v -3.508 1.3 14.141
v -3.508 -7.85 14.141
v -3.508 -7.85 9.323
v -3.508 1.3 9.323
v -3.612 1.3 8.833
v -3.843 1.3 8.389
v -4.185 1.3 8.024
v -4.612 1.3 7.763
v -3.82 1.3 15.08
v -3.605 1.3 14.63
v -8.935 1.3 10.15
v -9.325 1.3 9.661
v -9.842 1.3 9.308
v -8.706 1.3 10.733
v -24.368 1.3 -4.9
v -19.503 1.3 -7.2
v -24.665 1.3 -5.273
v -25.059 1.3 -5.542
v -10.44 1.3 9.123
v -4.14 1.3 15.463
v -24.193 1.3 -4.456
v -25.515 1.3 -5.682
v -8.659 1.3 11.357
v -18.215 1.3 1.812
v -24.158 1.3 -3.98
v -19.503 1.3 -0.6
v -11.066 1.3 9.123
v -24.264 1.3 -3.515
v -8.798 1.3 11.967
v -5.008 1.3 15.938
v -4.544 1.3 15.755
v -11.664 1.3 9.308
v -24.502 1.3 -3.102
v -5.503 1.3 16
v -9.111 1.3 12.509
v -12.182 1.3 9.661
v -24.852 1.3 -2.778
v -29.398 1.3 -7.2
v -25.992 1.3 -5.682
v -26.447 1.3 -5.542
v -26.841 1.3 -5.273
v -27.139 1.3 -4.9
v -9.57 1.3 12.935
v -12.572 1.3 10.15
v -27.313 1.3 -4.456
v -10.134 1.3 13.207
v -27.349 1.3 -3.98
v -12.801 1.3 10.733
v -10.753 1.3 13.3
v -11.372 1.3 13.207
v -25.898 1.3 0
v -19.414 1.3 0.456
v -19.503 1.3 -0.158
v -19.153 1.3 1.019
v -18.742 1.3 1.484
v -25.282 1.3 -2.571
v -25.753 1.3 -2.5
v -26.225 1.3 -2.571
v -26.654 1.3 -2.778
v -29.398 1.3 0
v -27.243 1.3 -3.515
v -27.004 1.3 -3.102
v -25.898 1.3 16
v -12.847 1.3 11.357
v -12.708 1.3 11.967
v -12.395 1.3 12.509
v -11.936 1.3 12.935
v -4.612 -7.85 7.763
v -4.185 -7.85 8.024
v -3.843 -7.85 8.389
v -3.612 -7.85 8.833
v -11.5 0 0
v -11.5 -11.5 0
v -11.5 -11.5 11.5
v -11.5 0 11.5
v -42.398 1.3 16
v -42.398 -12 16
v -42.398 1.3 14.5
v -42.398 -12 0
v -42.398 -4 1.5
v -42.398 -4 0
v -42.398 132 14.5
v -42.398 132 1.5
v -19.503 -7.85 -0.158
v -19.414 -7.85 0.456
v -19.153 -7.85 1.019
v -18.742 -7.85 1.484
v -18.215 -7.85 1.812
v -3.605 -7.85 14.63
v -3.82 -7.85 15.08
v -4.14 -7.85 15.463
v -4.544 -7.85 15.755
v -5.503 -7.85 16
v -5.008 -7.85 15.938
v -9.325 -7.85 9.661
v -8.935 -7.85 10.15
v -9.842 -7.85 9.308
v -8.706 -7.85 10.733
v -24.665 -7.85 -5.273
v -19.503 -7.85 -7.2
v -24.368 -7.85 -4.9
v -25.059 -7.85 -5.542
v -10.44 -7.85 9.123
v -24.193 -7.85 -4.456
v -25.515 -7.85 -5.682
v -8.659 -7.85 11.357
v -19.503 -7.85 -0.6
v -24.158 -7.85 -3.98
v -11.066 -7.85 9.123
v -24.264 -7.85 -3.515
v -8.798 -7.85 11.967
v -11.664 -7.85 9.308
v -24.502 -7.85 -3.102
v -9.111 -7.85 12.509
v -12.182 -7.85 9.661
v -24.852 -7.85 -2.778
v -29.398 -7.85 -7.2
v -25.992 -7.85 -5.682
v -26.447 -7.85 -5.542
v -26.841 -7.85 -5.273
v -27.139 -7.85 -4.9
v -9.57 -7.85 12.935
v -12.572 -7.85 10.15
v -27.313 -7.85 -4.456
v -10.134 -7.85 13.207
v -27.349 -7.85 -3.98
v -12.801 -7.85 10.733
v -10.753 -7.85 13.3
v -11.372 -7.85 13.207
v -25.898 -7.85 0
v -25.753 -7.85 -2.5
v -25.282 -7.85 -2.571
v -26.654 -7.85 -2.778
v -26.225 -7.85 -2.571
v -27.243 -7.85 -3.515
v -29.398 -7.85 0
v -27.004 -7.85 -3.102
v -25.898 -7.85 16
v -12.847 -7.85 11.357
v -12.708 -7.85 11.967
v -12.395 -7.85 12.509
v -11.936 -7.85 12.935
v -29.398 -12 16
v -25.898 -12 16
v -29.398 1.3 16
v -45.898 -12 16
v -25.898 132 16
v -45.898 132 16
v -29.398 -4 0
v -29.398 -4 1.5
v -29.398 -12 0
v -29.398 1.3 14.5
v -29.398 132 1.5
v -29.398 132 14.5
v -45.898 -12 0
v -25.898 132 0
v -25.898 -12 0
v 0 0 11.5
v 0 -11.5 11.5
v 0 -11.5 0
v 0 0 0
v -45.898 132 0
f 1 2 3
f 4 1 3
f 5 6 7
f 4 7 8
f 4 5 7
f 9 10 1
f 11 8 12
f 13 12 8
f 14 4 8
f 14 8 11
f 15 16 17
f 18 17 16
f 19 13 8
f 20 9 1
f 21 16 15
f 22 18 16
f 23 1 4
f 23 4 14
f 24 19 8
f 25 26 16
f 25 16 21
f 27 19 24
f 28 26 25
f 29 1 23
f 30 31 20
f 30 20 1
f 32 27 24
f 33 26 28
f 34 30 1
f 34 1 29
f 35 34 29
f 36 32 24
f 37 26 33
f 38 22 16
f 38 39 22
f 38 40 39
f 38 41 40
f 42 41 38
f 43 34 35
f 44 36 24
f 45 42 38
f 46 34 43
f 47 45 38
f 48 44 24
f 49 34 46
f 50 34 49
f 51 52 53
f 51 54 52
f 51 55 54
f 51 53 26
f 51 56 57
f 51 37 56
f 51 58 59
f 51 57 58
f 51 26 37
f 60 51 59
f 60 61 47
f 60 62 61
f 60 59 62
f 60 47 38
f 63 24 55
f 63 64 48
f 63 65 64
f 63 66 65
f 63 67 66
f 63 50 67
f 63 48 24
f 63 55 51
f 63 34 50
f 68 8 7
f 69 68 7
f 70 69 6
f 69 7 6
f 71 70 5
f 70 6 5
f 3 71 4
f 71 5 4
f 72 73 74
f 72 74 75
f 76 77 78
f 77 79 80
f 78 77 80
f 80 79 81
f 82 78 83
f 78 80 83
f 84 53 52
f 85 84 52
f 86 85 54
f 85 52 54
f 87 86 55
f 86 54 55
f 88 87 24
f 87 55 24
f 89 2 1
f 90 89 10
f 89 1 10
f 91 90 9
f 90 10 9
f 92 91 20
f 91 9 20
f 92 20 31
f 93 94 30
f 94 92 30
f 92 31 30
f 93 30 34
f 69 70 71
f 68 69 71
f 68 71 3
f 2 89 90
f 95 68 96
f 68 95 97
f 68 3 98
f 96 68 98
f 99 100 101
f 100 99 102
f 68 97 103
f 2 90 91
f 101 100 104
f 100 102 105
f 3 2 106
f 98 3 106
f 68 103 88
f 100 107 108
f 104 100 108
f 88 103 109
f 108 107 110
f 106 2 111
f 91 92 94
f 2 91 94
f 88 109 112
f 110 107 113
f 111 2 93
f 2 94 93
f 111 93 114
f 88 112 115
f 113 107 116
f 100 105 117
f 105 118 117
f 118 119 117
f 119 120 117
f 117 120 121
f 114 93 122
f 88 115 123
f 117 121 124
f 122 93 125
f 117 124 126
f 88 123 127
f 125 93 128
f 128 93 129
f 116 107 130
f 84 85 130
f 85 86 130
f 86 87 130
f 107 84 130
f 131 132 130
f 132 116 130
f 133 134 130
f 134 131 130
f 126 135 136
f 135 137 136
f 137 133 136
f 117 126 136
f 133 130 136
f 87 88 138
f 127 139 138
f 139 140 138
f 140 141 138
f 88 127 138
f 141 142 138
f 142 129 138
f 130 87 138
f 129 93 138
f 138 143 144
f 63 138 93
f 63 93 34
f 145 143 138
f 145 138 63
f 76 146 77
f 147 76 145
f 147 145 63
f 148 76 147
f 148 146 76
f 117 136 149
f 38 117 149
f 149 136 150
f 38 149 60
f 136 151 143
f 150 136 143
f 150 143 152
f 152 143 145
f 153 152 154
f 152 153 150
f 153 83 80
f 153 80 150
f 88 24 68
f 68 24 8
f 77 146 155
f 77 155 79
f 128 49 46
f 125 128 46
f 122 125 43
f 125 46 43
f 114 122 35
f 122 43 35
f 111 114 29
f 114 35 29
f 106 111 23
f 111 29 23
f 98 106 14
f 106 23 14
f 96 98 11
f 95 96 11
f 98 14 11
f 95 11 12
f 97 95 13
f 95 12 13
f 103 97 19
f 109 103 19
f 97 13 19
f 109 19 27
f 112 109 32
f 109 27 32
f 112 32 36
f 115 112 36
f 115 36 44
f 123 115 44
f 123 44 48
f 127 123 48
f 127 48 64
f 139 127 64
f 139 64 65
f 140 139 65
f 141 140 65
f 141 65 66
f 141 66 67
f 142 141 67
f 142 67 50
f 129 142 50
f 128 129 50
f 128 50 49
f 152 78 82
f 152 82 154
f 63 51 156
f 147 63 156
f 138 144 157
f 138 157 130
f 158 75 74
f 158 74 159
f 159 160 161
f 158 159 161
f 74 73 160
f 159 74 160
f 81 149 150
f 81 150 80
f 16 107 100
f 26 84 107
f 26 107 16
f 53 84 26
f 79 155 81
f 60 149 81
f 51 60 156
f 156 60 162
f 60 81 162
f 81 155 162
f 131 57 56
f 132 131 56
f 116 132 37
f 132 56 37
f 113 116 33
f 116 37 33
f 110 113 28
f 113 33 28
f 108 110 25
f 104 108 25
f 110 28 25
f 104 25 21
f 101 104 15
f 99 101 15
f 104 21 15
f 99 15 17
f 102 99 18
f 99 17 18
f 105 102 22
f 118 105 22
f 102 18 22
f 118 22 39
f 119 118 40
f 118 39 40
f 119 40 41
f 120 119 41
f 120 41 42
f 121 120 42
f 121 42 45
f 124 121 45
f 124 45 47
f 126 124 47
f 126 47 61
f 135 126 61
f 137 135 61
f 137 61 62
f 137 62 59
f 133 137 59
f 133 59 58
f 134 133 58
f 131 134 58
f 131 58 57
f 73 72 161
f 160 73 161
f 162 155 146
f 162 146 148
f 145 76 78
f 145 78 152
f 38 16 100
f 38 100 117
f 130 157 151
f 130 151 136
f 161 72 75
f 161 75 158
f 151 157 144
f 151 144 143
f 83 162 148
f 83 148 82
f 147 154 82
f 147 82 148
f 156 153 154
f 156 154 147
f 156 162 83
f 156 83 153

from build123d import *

# Parameters (mm, degrees)
SKETCH1_W           = 11.5
SKETCH1_H           = 11.5
BOSS_EXTRUDE1_DEPTH = 11.5
SKETCH2_W           = 20
SKETCH2_H           = 144
BOSS_EXTRUDE2_DEPTH = 16
SKETCH4_W           = 13
SKETCH4_H           = 13
CUT_EXTRUDE1_DEPTH  = 152.98237065
SKETCH5_W           = 13
SKETCH5_H           = 13.3
CUT_EXTRUDE2_DEPTH  = 1.5
SKETCH6_W           = 13
SKETCH6_H           = 8
CUT_EXTRUDE3_DEPTH  = 1.5
SKETCH10_W          = 16
SKETCH10_H          = 13.3
BOSS_EXTRUDE3_DEPTH = 3.79
SKETCH11_W          = 7.29
SKETCH11_H          = 13.3
BOSS_EXTRUDE4_DEPTH = 7.2
SKETCH12_R          = 1.6
CUT_EXTRUDE4_DEPTH  = 13.3
SKETCH13_W          = 3.79
SKETCH13_H          = 4.15
CUT_EXTRUDE6_DEPTH  = 16
SKETCH15_W          = 7.2
SKETCH15_H          = 4.15
CUT_EXTRUDE7_DEPTH  = 16
SKETCH17_W          = 16.6
SKETCH17_H          = 9.15
BOSS_EXTRUDE5_DEPTH = 18.6
CUT_EXTRUDE10_DEPTH = 18.6
SKETCH22_R          = 2.1
CUT_EXTRUDE11_DEPTH = 18.6
SKETCH24_W          = 2.604961471
SKETCH24_H          = 9.15
BOSS_EXTRUDE6_DEPTH = 6.6


with BuildPart() as part:
    # Sketch1 → Boss-Extrude1 (new body)
    with BuildSketch(Plane.XY):
        with Locations((-5.75, -5.75)):
            Rectangle(SKETCH1_W, SKETCH1_H)
    extrude(amount=BOSS_EXTRUDE1_DEPTH)


with BuildPart() as body_2:
    # Sketch2 → Boss-Extrude2 (new body)
    with BuildSketch(Plane.XY):
        with Locations((-35.898158877, 60)):
            Rectangle(SKETCH2_W, SKETCH2_H)
    extrude(amount=BOSS_EXTRUDE2_DEPTH)

    # Sketch4 → Cut-Extrude1 (cut, through all)
    with BuildSketch(Plane(origin=(0, 132, 0), x_dir=(1, 0, 0), z_dir=(0, 1, 0))):
        with Locations((-35.898158877, -8)):
            Rectangle(SKETCH4_W, SKETCH4_H)
    extrude(amount=-CUT_EXTRUDE1_DEPTH, mode=Mode.SUBTRACT)

    # Sketch5 → Cut-Extrude2 (cut)
    with BuildSketch(Plane.XY.offset(16)):
        with Locations((-35.898158877, -5.35)):
            Rectangle(SKETCH5_W, SKETCH5_H)
    extrude(amount=-CUT_EXTRUDE2_DEPTH, mode=Mode.SUBTRACT)

    # Sketch6 → Cut-Extrude3 (cut)
    with BuildSketch(Plane(origin=(0, 0, 0), x_dir=(-1, 0, 0), z_dir=(0, 0, -1))):
        with Locations((35.898158877, -8)):
            Rectangle(SKETCH6_W, SKETCH6_H)
    extrude(amount=-CUT_EXTRUDE3_DEPTH, mode=Mode.SUBTRACT)

    # Sketch10 → Boss-Extrude3 (add)
    with BuildSketch(Plane(origin=(-25.898158877, 0, 0), x_dir=(0, 0, -1), z_dir=(1, 0, 0))):
        with Locations((-8, -5.35)):
            Rectangle(SKETCH10_W, SKETCH10_H)
    extrude(amount=BOSS_EXTRUDE3_DEPTH)

    # Sketch11 → Boss-Extrude4 (add)
    with BuildSketch(Plane(origin=(0, 0, 0), x_dir=(-1, 0, 0), z_dir=(0, 0, -1))):
        with Locations((25.753158877, -5.35)):
            Rectangle(SKETCH11_W, SKETCH11_H)
    extrude(amount=BOSS_EXTRUDE4_DEPTH)

    # Sketch12 → Cut-Extrude4 (cut)
    with BuildSketch(Plane(origin=(0, 1.3, 0), x_dir=(1, 0, 0), z_dir=(0, 1, 0))):
        with Locations(Location((-25.753158877, 4.1, 0), (0, 0, 270))):
            Circle(SKETCH12_R)
    extrude(amount=-CUT_EXTRUDE4_DEPTH, mode=Mode.SUBTRACT)

    # Sketch13 → Cut-Extrude6 (cut)
    with BuildSketch(Plane.XY.offset(16)):
        with Locations((-24.003158877, -9.925)):
            Rectangle(SKETCH13_W, SKETCH13_H)
    extrude(amount=-CUT_EXTRUDE6_DEPTH, mode=Mode.SUBTRACT)

    # Sketch15 → Cut-Extrude7 (cut)
    with BuildSketch(Plane(origin=(-22.108158877, 0, 0), x_dir=(0, 0, -1), z_dir=(1, 0, 0))):
        with Locations((3.6, -9.925)):
            Rectangle(SKETCH15_W, SKETCH15_H)
    extrude(amount=-CUT_EXTRUDE7_DEPTH, mode=Mode.SUBTRACT)

    # Sketch17 → Boss-Extrude5 (add)
    with BuildSketch(Plane(origin=(-22.108158877, 0, 0), x_dir=(0, 0, -1), z_dir=(1, 0, 0))):
        with Locations((-7.7, -3.275)):
            Rectangle(SKETCH17_W, SKETCH17_H)
    extrude(amount=BOSS_EXTRUDE5_DEPTH)

    # Sketch18 → Cut-Extrude10 (cut)
    with BuildSketch(Plane(origin=(0, 1.3, 0), x_dir=(1, 0, 0), z_dir=(0, 1, 0))):
        with BuildLine():
            ThreePointArc((-4.611682563, -7.76314008), (-3.843042235, -8.389419264), (-3.508158877, -9.322632373))
            Line((-3.508158877, -9.322632373), (-3.508158877, 0.6))
            Line((-3.508158877, 0.6), (-19.503197406, 0.6))
            Line((-19.503197406, 0.6), (-19.503197406, 0.15803115))
            ThreePointArc((-19.503197406, 0.15803115), (-19.152542434, -1.018768523), (-18.214957899, -1.81170712))
            Line((-18.214957899, -1.81170712), (-4.611682563, -7.76314008))
        make_face()
        with BuildLine():
            ThreePointArc((-3.508158877, -14.140788033), (-4.139668174, -15.463143203), (-5.503197406, -16))
            Line((-5.503197406, -16), (-3.508158877, -16))
            Line((-3.508158877, -16), (-3.508158877, -14.140788033))
        make_face()
    extrude(amount=-CUT_EXTRUDE10_DEPTH, mode=Mode.SUBTRACT)

    # Sketch22 → Cut-Extrude11 (cut)
    with BuildSketch(Plane(origin=(0, 1.3, 0), x_dir=(1, 0, 0), z_dir=(0, 1, 0))):
        with Locations(Location((-10.753197406, -11.2, 0), (0, 0, 270))):
            Circle(SKETCH22_R)
    extrude(amount=-CUT_EXTRUDE11_DEPTH, mode=Mode.SUBTRACT)

    # Sketch24 → Boss-Extrude6 (add)
    with BuildSketch(Plane(origin=(0, 0, -0.6), x_dir=(-1, 0, 0), z_dir=(0, 0, -1))):
        with Locations((20.805678142, -3.275)):
            Rectangle(SKETCH24_W, SKETCH24_H)
    extrude(amount=BOSS_EXTRUDE6_DEPTH)


solid = Compound([part.part, body_2.part])
